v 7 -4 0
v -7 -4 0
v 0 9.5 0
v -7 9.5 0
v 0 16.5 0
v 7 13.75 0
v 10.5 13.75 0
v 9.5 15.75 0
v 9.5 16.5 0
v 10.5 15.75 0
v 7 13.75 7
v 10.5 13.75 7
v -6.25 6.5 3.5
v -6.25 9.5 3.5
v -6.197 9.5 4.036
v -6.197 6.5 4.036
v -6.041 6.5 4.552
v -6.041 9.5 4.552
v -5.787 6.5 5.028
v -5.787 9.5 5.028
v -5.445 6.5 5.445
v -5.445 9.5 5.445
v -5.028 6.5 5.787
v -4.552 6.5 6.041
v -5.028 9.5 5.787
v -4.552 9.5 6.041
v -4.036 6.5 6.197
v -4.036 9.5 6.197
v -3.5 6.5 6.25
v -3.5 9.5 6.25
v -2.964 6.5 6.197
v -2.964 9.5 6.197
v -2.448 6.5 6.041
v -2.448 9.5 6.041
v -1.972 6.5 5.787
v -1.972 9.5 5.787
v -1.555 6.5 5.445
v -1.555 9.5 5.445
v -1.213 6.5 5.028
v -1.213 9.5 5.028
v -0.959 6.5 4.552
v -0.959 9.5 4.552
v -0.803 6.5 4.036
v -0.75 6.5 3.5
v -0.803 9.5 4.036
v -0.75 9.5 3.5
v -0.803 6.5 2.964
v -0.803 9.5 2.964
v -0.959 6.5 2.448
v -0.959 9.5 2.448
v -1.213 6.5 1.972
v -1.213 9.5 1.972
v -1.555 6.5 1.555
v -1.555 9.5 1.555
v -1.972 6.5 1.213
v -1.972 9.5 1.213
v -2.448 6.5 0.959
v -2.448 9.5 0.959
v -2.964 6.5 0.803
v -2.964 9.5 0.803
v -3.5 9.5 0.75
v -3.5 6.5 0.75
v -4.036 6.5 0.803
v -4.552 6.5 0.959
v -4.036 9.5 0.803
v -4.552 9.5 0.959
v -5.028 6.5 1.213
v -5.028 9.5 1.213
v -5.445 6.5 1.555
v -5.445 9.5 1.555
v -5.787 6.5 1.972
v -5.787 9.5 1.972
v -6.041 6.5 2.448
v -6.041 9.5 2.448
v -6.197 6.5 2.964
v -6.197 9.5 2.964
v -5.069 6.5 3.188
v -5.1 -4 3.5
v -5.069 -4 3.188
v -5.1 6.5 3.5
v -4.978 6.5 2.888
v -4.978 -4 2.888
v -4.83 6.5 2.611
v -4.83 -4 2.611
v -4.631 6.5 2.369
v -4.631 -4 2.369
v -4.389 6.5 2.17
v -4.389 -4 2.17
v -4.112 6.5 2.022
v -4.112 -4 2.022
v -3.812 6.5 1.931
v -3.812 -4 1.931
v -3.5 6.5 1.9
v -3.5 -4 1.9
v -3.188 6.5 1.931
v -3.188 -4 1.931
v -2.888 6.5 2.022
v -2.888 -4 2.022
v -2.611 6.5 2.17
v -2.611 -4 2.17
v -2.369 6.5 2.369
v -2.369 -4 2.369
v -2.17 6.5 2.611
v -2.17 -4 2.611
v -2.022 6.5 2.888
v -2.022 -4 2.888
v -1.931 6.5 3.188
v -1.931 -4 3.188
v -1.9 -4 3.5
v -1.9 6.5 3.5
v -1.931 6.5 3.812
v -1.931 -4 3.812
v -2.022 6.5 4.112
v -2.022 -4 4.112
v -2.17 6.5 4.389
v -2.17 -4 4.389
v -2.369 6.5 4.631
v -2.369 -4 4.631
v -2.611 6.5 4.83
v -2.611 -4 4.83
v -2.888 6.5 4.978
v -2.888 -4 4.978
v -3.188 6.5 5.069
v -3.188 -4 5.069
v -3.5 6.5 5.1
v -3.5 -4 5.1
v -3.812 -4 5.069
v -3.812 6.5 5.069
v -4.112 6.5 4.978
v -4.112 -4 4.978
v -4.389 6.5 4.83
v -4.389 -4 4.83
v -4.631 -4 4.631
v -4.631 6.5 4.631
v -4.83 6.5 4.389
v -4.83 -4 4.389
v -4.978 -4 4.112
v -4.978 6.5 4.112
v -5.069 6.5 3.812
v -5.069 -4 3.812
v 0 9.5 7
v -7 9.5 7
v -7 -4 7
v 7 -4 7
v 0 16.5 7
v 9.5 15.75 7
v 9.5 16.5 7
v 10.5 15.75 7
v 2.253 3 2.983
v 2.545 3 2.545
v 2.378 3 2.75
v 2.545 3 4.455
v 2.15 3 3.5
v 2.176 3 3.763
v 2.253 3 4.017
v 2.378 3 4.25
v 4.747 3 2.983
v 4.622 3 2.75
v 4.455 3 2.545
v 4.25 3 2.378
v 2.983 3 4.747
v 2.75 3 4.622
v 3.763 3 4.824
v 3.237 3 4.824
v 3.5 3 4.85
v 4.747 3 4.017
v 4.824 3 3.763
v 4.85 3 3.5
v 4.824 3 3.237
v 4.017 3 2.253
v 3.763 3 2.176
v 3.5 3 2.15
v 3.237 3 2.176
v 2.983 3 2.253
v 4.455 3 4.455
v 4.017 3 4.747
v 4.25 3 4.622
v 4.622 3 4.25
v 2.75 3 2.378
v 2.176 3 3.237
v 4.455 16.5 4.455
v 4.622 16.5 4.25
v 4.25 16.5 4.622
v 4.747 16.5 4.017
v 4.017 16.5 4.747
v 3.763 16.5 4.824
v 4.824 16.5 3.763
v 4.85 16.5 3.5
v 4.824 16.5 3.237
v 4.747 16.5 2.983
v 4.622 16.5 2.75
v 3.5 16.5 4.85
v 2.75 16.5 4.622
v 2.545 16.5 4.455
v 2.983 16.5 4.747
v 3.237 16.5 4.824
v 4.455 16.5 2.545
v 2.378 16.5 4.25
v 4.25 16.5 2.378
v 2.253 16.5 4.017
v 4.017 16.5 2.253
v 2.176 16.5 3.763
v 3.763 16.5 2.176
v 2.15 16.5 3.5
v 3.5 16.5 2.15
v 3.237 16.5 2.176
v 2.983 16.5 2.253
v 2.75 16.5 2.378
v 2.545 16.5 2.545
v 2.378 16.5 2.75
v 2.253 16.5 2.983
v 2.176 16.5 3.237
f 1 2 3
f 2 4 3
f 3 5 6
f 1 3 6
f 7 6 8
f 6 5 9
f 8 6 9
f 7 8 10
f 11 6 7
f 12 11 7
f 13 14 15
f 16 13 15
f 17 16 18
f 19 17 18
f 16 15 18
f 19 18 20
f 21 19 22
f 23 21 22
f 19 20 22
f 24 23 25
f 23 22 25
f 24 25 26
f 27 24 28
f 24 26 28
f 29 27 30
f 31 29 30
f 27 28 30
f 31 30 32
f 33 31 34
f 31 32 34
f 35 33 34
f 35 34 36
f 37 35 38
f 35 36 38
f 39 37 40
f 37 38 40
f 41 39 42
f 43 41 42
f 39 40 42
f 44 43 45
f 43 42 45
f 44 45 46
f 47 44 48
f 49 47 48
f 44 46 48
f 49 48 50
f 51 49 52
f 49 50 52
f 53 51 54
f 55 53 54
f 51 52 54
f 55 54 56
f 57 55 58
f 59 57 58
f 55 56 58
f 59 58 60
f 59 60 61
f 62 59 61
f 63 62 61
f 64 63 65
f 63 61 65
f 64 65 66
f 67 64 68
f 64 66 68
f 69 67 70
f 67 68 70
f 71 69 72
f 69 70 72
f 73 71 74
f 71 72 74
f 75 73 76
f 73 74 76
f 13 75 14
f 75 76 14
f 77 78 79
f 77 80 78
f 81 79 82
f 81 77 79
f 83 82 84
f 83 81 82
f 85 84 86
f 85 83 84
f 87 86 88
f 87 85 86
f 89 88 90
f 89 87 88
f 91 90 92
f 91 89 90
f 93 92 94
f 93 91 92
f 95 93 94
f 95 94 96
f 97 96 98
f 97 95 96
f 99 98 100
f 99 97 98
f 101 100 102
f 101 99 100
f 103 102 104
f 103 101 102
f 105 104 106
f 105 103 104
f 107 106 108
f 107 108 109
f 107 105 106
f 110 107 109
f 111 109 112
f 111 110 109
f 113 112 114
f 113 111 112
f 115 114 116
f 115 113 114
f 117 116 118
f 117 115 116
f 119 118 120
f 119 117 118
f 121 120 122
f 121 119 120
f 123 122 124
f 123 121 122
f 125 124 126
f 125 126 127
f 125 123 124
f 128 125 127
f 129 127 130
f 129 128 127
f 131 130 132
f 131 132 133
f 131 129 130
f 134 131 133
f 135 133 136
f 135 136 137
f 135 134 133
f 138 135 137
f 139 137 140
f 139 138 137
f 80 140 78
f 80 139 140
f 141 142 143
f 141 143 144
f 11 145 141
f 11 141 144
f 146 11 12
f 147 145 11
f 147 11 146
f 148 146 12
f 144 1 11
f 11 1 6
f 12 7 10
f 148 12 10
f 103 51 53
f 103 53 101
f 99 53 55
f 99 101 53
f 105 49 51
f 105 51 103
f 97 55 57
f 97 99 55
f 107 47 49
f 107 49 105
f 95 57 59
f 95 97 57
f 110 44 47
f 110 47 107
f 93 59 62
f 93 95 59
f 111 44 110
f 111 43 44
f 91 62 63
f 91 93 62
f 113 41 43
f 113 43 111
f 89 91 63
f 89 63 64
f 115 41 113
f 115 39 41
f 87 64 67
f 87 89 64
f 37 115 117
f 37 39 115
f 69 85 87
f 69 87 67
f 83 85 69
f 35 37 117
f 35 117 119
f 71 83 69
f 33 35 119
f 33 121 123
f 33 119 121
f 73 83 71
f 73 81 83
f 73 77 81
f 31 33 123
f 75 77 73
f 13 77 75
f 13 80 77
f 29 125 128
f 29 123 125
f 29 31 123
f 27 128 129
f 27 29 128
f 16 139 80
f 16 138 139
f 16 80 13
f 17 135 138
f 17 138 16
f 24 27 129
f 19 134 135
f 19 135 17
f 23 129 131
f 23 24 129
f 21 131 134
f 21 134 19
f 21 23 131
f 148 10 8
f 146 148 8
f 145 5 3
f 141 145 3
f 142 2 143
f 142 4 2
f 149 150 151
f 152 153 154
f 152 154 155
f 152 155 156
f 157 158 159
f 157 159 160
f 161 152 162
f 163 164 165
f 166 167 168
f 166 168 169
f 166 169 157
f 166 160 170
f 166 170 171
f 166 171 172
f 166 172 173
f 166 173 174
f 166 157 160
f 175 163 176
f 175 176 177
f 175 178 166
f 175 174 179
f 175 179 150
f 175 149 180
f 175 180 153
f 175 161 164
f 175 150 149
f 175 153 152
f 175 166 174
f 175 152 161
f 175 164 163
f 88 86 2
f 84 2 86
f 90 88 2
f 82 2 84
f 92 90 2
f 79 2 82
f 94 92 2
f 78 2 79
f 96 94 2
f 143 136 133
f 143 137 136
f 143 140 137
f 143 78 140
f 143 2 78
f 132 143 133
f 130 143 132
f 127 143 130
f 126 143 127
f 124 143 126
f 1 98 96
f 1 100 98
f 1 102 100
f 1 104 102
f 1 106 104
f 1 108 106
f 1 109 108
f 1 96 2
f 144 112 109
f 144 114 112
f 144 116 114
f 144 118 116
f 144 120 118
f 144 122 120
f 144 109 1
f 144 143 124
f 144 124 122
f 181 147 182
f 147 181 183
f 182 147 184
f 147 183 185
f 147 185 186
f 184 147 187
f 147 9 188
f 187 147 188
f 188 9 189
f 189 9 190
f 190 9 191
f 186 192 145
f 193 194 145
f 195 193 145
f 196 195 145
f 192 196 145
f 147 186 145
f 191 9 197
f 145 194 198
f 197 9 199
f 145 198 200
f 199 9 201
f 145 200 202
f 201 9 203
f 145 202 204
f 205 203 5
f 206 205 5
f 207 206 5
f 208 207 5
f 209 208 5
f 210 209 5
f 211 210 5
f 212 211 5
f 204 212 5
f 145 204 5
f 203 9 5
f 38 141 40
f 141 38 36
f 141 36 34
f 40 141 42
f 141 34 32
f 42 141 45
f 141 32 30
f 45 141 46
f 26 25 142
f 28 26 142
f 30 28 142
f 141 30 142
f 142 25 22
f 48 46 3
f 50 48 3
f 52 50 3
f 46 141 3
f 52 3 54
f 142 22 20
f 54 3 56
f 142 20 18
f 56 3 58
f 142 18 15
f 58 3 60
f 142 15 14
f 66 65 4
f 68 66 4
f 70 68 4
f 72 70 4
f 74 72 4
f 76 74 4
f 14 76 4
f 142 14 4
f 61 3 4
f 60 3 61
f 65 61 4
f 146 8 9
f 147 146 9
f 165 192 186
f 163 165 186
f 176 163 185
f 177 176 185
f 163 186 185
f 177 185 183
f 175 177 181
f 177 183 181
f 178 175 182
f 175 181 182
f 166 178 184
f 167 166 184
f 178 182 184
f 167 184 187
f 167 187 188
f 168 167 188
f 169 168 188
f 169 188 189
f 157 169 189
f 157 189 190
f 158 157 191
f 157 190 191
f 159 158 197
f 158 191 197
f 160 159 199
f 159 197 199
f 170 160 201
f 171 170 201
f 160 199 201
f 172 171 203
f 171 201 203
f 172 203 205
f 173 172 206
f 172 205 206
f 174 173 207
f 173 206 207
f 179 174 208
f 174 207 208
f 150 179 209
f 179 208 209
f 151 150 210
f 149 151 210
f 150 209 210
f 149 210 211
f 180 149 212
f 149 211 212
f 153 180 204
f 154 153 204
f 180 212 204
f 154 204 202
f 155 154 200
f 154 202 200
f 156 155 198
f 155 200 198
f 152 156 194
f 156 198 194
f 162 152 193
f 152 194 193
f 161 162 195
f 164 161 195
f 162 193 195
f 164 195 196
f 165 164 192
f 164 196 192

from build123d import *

# Parameters (mm, degrees)
SALIENTE_EXTRUIR1_DEPTH = 7
CROQUIS4_R              = 1.35
CORTAR_EXTRUIR1_DEPTH   = 13.5
CROQUIS5_R              = 1.6
CORTAR_EXTRUIR2_DEPTH   = 13.9
CROQUIS6_R              = 2.75
CORTAR_EXTRUIR3_DEPTH   = 3
CROQUIS7_W              = 11
CROQUIS7_H              = 7
CROQUIS7_R              = 1.6
SALIENTE_EXTRUIR2_DEPTH = 4


with BuildPart() as part:
    # Croquis1 → Saliente-Extruir1 (new body)
    with BuildSketch(Plane.XY):
        Polygon((0, 0), (4, 0), (4, -4), (7, -4), (7, 0), (7, 13.75), (10.5, 13.75), (10.5, 15.75), (9.5, 15.75), (9.5, 16.5), (7, 16.5), (0, 16.5), (0, 9.5), (-7, 9.5), (-7, 0), align=None)
    extrude(amount=SALIENTE_EXTRUIR1_DEPTH)

    # Croquis4 → Cortar-Extruir1 (cut)
    with BuildSketch(Plane(origin=(0, 16.5, 0), x_dir=(1, 0, 0), z_dir=(0, 1, 0))):
        with Locations(Location((3.5, -3.5, 0), (0, 0, 270))):
            Circle(CROQUIS4_R)
    extrude(amount=-CORTAR_EXTRUIR1_DEPTH, mode=Mode.SUBTRACT)

    # Croquis5 → Cortar-Extruir2 (cut)
    with BuildSketch(Plane(origin=(0, 9.5, 0), x_dir=(1, 0, 0), z_dir=(0, 1, 0))):
        with Locations(Location((-3.5, -3.5, 0), (0, 0, 180))):
            Circle(CROQUIS5_R)
    extrude(amount=-CORTAR_EXTRUIR2_DEPTH, mode=Mode.SUBTRACT)

    # Croquis6 → Cortar-Extruir3 (cut)
    with BuildSketch(Plane(origin=(0, 9.5, 0), x_dir=(1, 0, 0), z_dir=(0, 1, 0))):
        with Locations(Location((-3.5, -3.5, 0), (0, 0, 180))):
            Circle(CROQUIS6_R)
    extrude(amount=-CORTAR_EXTRUIR3_DEPTH, mode=Mode.SUBTRACT)

    # Croquis7 → Saliente-Extruir2 (add)
    with BuildSketch(Plane.XZ):
        with Locations((-1.5, 3.5)):
            Rectangle(CROQUIS7_W, CROQUIS7_H)
        with Locations(Location((-3.5, 3.5, 0), (0, 0, 180))):
            Circle(CROQUIS7_R, mode=Mode.SUBTRACT)
    extrude(amount=SALIENTE_EXTRUIR2_DEPTH)


solid = part.part
